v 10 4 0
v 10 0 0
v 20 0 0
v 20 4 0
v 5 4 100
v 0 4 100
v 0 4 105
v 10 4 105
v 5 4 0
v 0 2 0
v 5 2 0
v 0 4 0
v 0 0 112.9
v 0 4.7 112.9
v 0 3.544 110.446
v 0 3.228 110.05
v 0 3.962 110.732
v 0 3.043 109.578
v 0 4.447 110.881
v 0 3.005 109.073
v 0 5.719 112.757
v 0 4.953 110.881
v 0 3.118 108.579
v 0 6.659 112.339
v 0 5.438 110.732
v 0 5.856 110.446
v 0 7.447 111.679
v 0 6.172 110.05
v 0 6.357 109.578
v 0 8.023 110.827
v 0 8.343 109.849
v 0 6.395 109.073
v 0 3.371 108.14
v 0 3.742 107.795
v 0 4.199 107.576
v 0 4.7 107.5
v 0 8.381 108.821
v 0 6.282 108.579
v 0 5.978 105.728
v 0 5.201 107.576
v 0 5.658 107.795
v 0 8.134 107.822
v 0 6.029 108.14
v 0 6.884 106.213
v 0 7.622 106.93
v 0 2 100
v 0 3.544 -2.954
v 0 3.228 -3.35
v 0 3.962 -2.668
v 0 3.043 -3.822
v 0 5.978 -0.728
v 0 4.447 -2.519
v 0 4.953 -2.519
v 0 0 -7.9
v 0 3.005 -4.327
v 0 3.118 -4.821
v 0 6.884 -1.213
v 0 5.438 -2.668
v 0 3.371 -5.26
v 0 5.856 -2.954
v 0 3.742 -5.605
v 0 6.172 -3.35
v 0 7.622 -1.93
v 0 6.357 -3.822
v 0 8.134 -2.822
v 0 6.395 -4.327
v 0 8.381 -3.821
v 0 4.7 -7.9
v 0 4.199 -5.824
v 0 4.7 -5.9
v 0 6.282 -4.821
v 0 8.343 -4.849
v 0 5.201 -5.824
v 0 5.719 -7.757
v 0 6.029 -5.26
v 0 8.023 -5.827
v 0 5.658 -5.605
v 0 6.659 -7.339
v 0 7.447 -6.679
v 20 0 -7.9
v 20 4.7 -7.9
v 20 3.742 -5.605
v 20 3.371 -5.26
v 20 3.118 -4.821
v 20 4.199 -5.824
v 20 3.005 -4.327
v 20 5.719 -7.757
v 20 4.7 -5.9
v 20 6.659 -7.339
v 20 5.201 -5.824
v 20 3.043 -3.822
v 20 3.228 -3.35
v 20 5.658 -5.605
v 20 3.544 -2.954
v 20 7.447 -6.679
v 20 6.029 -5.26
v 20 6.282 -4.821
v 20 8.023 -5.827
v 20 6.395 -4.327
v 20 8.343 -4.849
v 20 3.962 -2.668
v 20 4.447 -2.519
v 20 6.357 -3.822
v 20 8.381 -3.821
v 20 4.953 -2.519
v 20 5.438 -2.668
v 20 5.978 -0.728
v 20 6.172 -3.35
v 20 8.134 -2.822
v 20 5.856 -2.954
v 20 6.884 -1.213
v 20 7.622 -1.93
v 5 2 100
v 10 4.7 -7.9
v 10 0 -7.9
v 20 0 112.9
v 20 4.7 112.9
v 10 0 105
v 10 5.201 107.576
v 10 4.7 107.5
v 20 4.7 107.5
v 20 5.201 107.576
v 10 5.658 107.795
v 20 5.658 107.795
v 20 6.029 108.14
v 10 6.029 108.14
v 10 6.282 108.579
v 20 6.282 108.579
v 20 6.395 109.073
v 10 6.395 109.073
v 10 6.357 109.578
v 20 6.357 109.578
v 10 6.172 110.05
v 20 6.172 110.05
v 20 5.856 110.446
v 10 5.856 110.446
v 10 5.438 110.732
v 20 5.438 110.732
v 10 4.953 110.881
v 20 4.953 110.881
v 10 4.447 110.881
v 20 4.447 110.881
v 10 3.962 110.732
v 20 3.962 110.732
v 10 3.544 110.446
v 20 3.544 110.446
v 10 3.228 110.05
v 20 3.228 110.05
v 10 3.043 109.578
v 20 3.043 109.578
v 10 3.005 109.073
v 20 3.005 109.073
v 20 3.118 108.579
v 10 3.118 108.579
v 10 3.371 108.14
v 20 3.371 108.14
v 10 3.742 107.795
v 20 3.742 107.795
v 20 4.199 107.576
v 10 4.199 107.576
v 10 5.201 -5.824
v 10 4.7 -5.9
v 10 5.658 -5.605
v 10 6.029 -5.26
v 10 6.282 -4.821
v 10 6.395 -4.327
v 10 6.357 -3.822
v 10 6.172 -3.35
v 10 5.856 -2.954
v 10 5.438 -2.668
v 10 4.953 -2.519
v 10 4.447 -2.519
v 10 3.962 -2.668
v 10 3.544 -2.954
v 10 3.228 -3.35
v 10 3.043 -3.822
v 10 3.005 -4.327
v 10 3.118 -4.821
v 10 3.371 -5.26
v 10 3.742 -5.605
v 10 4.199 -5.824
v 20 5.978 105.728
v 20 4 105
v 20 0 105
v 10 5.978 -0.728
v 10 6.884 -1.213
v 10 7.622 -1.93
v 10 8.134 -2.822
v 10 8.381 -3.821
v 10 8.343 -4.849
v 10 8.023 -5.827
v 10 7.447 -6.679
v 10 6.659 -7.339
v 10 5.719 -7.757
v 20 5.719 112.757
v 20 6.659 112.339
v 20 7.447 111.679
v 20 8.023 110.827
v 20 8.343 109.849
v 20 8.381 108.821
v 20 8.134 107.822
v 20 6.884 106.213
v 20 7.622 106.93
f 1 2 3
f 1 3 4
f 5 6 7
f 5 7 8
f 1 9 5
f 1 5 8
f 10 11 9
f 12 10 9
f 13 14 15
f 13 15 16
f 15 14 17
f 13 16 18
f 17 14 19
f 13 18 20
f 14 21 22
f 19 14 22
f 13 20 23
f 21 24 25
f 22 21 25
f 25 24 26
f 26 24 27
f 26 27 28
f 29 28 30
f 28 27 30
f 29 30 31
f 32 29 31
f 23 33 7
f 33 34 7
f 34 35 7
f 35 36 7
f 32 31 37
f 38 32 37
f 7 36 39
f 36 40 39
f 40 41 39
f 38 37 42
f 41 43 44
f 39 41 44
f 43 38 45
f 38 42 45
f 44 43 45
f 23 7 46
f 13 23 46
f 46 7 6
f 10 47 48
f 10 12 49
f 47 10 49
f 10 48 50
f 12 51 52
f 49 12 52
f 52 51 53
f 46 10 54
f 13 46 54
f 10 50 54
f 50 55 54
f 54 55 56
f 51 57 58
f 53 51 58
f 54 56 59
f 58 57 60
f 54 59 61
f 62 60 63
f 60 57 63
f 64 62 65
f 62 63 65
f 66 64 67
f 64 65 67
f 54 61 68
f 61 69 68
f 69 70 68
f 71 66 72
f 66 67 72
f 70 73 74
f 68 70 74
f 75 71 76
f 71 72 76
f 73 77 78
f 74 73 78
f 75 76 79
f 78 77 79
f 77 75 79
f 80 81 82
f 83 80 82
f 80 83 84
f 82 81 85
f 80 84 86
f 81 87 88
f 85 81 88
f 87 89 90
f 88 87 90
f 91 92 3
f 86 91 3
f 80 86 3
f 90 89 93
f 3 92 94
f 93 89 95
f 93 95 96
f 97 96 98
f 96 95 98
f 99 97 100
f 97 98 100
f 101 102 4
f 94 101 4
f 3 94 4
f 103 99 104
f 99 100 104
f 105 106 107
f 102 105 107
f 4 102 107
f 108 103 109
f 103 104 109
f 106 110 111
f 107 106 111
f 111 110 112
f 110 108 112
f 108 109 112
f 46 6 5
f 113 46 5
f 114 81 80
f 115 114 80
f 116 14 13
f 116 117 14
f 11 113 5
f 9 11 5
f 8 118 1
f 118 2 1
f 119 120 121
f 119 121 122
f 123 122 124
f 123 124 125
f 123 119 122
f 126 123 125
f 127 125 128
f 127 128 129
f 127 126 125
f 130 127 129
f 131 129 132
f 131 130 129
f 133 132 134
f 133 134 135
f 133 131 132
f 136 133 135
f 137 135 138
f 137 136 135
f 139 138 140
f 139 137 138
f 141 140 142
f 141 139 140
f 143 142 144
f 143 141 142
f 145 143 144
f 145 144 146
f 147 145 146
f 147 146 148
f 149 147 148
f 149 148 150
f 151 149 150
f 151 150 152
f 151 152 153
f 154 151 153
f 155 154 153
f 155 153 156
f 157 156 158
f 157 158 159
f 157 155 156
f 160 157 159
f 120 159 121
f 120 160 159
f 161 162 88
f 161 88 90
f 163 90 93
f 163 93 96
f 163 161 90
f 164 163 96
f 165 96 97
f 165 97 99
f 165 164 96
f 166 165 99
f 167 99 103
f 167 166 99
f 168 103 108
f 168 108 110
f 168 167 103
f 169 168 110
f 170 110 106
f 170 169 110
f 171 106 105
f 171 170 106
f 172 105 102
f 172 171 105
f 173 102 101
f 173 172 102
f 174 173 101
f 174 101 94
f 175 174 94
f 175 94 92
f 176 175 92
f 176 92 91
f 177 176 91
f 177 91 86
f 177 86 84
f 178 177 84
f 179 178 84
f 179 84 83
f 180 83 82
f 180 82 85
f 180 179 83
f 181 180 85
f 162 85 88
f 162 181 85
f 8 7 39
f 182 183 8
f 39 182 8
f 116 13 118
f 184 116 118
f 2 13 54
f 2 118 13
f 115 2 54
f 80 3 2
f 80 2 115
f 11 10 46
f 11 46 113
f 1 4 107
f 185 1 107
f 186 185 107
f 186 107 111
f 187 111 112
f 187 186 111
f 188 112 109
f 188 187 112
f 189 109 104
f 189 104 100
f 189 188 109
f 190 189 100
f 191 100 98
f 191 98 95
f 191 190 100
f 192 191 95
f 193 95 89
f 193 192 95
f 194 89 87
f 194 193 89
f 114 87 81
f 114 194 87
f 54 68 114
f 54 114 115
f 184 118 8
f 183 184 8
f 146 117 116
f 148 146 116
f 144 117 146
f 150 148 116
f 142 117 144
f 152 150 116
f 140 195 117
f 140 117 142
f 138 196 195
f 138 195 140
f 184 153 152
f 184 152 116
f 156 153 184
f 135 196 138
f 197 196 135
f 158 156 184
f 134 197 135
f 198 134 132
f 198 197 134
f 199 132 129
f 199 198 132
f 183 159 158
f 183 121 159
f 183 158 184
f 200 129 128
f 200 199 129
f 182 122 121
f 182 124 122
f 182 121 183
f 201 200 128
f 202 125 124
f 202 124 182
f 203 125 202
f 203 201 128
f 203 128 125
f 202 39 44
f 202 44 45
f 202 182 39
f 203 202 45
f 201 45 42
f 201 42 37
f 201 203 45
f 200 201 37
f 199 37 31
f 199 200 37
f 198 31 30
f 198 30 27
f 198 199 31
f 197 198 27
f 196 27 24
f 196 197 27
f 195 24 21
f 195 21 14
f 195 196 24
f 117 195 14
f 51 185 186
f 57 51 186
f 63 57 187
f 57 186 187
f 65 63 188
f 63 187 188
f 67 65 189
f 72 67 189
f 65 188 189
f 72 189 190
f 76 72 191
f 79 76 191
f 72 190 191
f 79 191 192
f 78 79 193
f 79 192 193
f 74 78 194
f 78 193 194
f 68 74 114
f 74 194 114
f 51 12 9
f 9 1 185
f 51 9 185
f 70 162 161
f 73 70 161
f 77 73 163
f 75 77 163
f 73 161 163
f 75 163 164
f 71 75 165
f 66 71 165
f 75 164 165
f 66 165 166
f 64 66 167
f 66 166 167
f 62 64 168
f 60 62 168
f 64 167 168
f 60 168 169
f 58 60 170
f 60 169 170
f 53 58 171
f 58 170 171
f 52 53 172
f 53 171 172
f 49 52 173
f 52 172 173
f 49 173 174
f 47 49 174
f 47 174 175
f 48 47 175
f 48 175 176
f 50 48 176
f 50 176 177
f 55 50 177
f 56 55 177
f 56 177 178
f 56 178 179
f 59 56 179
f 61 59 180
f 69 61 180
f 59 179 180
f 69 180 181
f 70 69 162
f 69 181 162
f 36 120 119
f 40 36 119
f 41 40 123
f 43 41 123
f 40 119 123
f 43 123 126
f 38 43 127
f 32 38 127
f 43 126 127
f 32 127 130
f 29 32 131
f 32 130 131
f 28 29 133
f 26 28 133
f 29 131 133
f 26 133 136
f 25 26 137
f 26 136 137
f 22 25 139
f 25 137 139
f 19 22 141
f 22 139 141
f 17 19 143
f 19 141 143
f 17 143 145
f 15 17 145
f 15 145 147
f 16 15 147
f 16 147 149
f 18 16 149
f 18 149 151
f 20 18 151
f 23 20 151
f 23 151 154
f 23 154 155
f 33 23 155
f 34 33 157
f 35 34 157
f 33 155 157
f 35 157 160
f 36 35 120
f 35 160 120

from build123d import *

# Parameters (mm, degrees)
RESSALTO_EXTRUS_O1_DEPTH      = 100
ESBO_O3_W                     = 10
ESBO_O3_H                     = 4
RESSALTO_EXTRUS_O2_DEPTH      = 5
ESBO_O4_R                     = 1.7
RESSALTO_EXTRUS_O3_DEPTH      = 10
RESSALTO_EXTRUS_O3_DEPTH_BACK = 10


with BuildPart() as part:
    # Esboço1 → Ressalto-extrusão1 (new body)
    with BuildSketch(Plane.XY):
        Polygon((0, 0), (0, 2), (5, 2), (5, 4), (10, 4), (10, 0), align=None)
    extrude(amount=RESSALTO_EXTRUS_O1_DEPTH)

    # Esboço3 → Ressalto-extrusão2 (add)
    with BuildSketch(Plane.XY.offset(100)):
        with Locations((5, 2)):
            Rectangle(ESBO_O3_W, ESBO_O3_H)
    extrude(amount=RESSALTO_EXTRUS_O2_DEPTH)

    # Esboço4 → Ressalto-extrusão3 (add, two sides)
    with BuildSketch(Plane(origin=(10, 0, 0), x_dir=(0, 0, -1), z_dir=(1, 0, 0))) as ressalto_extrus_o3_sk:
        with BuildLine():
            Line((-112.9, 4.7), (-112.9, 0))
            Line((-112.9, 0), (-105, 0))
            Line((-105, 0), (-105, 4))
            Line((-105, 4), (-105.72755275, 5.977540643))
            ThreePointArc((-105.72755275, 5.977540643), (-109.848824003, 8.342667623), (-112.9, 4.7))
        make_face()
        with Locations((-109.2, 4.7)):
            Circle(ESBO_O4_R, mode=Mode.SUBTRACT)
        with BuildLine():
            Line((7.9, 0), (0, 0))
            Line((0, 0), (0, 4))
            Line((0, 4), (0.72755275, 5.977540643))
            ThreePointArc((0.72755275, 5.977540643), (4.848824003, 8.342667623), (7.9, 4.7))
            Line((7.9, 4.7), (7.9, 0))
        make_face()
        with Locations((4.2, 4.7)):
            Circle(ESBO_O4_R, mode=Mode.SUBTRACT)
    extrude(amount=RESSALTO_EXTRUS_O3_DEPTH)
    extrude(ressalto_extrus_o3_sk.sketch, amount=-RESSALTO_EXTRUS_O3_DEPTH_BACK)


solid = part.part
